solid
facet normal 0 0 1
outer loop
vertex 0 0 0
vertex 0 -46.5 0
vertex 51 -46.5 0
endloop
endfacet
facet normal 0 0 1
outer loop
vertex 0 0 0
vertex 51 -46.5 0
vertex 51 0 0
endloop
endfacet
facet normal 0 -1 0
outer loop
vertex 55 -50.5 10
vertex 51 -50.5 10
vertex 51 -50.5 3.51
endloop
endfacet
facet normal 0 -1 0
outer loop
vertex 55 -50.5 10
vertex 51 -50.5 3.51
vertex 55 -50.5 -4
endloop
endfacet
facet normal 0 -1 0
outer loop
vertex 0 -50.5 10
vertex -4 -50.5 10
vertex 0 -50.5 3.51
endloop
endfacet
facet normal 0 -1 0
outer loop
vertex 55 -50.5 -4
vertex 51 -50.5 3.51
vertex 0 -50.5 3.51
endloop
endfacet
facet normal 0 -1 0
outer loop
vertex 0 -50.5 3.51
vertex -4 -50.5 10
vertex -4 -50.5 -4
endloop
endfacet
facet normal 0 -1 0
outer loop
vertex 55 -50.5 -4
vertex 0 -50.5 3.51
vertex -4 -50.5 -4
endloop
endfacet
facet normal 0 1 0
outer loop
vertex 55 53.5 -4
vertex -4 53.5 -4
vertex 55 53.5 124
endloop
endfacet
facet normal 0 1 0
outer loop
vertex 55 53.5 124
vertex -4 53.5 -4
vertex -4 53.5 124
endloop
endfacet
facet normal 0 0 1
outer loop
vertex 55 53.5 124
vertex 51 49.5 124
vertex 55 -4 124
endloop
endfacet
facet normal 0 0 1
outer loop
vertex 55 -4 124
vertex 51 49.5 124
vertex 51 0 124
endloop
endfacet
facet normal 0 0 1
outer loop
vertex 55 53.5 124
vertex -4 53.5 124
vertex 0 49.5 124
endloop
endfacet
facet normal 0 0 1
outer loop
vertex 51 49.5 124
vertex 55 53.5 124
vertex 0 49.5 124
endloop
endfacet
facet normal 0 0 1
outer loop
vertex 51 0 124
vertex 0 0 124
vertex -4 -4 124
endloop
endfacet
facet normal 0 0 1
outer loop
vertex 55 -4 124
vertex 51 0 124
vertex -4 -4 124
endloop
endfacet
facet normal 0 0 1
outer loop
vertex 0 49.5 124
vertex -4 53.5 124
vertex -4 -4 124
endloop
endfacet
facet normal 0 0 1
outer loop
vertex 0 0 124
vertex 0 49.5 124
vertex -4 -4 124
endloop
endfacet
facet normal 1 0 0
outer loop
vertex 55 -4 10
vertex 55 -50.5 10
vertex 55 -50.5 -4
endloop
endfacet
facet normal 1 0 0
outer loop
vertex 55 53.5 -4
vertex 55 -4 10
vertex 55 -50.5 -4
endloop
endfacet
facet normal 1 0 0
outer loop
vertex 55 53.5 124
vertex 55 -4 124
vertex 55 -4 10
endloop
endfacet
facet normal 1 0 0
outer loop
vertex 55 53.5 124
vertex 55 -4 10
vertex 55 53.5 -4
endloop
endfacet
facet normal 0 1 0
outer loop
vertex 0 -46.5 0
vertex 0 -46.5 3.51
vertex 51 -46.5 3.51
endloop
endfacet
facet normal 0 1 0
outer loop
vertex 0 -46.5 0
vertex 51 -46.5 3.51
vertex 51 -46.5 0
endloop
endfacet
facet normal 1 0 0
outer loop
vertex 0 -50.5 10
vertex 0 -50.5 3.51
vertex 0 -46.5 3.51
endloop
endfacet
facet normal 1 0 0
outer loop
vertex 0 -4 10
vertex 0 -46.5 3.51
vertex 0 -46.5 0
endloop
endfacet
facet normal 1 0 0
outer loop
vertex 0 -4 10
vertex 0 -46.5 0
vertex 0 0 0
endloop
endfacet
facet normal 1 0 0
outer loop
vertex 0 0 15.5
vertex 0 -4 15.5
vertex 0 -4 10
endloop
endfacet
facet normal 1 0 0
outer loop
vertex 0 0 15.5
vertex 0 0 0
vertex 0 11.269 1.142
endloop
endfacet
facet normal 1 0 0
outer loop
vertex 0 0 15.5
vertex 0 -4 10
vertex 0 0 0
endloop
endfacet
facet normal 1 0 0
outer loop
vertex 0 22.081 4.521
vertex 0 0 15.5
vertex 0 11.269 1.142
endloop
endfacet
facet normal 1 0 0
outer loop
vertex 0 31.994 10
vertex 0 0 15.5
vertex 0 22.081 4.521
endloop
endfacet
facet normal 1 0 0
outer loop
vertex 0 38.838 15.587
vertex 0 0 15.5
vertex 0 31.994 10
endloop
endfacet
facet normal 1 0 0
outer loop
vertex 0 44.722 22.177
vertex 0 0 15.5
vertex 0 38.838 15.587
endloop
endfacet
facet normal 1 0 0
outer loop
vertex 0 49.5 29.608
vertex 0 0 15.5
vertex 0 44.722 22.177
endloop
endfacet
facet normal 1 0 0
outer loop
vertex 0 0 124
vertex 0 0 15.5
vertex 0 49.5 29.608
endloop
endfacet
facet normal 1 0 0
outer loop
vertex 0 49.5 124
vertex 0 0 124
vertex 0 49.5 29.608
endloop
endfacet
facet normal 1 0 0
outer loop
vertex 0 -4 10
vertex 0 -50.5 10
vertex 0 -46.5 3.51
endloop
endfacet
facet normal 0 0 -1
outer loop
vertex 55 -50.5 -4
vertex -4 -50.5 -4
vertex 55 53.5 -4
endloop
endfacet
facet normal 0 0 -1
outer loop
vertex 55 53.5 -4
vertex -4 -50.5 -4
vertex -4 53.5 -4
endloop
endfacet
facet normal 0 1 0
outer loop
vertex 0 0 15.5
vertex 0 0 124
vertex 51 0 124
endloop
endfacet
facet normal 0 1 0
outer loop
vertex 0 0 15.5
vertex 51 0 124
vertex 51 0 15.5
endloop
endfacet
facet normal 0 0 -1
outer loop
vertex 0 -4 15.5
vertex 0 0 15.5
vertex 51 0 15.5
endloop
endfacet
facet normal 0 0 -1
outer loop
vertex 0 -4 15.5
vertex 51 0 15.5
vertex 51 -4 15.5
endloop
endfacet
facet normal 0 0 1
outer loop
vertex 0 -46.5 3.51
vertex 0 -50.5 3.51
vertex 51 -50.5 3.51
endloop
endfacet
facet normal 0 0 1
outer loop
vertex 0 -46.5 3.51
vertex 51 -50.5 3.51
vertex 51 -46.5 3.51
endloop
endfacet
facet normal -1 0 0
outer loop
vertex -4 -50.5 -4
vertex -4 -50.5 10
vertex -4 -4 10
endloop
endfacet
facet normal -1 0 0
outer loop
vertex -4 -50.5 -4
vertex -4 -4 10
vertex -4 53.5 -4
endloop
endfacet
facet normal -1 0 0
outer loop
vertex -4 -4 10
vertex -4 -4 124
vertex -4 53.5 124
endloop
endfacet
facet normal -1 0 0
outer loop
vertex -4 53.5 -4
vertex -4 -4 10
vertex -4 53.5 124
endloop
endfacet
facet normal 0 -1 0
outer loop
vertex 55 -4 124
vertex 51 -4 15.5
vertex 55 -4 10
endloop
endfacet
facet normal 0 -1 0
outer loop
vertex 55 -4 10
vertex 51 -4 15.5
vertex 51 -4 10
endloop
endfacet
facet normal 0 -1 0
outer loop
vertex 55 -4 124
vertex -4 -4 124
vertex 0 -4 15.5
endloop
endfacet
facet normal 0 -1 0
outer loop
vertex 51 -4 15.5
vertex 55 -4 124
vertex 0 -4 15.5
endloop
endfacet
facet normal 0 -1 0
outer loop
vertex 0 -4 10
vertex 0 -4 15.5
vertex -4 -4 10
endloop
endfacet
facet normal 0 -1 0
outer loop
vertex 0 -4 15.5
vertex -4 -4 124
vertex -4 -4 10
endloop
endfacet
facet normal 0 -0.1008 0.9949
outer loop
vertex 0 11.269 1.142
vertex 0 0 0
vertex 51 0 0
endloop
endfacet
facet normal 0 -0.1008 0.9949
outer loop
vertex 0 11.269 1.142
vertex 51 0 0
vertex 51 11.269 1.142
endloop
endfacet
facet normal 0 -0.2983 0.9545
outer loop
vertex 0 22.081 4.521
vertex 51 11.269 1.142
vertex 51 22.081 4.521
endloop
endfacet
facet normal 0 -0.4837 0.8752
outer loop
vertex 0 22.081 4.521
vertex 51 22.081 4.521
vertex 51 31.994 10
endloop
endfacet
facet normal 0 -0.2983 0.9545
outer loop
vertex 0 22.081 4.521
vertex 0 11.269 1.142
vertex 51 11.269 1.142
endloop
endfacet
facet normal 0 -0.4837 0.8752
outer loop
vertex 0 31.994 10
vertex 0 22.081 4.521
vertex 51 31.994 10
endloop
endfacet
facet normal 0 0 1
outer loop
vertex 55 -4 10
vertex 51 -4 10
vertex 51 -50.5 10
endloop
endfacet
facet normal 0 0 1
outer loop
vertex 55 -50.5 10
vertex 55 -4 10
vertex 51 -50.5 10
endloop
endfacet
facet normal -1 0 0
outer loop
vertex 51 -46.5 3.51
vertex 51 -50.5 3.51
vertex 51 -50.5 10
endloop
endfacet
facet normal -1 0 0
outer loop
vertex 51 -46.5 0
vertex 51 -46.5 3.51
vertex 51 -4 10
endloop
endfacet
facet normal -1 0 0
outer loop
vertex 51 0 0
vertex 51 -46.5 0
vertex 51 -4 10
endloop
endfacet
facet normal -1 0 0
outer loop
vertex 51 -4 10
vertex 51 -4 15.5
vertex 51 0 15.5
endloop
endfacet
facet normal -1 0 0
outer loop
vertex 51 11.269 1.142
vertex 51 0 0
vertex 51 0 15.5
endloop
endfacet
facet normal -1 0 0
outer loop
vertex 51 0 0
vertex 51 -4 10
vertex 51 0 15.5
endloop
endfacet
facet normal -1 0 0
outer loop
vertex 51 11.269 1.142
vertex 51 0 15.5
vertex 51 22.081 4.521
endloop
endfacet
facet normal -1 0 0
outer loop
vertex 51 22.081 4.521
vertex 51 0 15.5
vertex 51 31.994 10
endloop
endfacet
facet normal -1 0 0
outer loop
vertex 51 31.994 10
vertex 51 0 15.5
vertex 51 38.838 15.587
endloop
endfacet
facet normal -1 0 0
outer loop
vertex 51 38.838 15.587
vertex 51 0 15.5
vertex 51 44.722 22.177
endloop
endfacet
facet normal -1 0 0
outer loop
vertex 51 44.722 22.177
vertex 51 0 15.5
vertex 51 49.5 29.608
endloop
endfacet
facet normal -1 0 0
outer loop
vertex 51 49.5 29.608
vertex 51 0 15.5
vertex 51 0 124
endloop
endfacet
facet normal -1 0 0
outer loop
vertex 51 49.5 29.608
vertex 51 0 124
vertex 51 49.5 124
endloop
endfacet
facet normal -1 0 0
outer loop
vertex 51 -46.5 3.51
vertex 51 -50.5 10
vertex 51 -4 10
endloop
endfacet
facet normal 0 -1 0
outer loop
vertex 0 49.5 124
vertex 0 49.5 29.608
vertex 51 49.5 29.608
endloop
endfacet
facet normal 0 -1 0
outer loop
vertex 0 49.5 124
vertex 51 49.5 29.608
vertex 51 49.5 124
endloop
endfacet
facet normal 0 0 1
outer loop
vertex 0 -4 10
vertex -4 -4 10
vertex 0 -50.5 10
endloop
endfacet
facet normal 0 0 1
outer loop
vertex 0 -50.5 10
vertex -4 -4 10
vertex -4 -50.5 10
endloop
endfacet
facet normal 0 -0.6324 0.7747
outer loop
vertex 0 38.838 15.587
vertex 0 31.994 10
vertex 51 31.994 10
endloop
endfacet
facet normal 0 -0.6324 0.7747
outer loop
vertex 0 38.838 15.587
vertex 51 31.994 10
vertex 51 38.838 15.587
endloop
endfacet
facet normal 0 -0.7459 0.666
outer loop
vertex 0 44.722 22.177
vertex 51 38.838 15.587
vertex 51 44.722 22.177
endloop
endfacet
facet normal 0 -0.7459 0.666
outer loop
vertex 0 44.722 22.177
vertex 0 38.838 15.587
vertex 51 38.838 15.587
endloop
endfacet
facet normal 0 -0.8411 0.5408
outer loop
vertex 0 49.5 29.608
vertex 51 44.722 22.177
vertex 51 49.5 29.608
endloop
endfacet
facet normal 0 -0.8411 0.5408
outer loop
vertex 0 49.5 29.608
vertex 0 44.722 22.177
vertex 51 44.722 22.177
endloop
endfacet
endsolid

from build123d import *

# Parameters (mm, degrees)
F0_W     = 4
F0_H     = 6.48995
F0_W_2   = 49.5
F0_H_2   = 4
F1_DEPTH = 4
F2_DEPTH = 55
F3_DEPTH = 51


with BuildPart() as f1:
    # F0 (on Right) → F1 (new body)
    with BuildSketch(Plane.YZ):
        Polygon((46.5, 0), (0, 0), (-46.5, 0), (-46.5, 3.51005), (-50.5, 3.51005), (-50.5, -4), (0, -4), (46.5, -4), (53.5, -4), (53.5, 124), (49.5, 124), (49.5, 120), (49.5, 29.608211), (49.5, 0), align=None)
        with BuildLine():
            ThreePointArc((31.99437, 10), (16.760368, 2.558245), (0, 0))
            Line((0, 0), (46.5, 0))
            Line((46.5, 0), (49.5, 0))
            Line((49.5, 0), (49.5, 29.608211))
            ThreePointArc((49.5, 29.608211), (41.910065, 18.76592), (31.99437, 10))
        make_face()
        with BuildLine():
            Line((0, 10), (0, 0))
            ThreePointArc((0, 0), (16.760368, 2.558245), (31.99437, 10))
            Line((31.99437, 10), (0, 10))
        make_face()
        Polygon((-46.5, 0), (0, 0), (0, 10), (-4, 10), (-46.5, 10), (-46.5, 3.51005), align=None)
        with BuildLine():
            Line((0, 10), (31.99437, 10))
            ThreePointArc((31.99437, 10), (41.910065, 18.76592), (49.5, 29.608211))
            Line((49.5, 29.608211), (49.5, 120))
            Line((49.5, 120), (0, 120))
            Line((0, 120), (0, 56.181986))
            Line((0, 56.181986), (0, 15.5))
            Line((0, 15.5), (-4, 15.5))
            Line((-4, 15.5), (-4, 10))
            Line((-4, 10), (0, 10))
        make_face()
        with Locations((-48.5, 6.755025)):
            Rectangle(F0_W, F0_H)
        Polygon((-4, 124), (-4, 15.5), (0, 15.5), (0, 56.181986), (0, 120), (0, 124), align=None)
        with Locations((24.75, 122)):
            Rectangle(F0_W_2, F0_H_2)
    extrude(amount=-F1_DEPTH)

    # F0 (on Right) → F2 (join)
    with BuildSketch(Plane.YZ):
        Polygon((46.5, 0), (0, 0), (-46.5, 0), (-46.5, 3.51005), (-50.5, 3.51005), (-50.5, -4), (0, -4), (46.5, -4), (53.5, -4), (53.5, 124), (49.5, 124), (49.5, 120), (49.5, 29.608211), (49.5, 0), align=None)
        with BuildLine():
            ThreePointArc((31.99437, 10), (16.760368, 2.558245), (0, 0))
            Line((0, 0), (46.5, 0))
            Line((46.5, 0), (49.5, 0))
            Line((49.5, 0), (49.5, 29.608211))
            ThreePointArc((49.5, 29.608211), (41.910065, 18.76592), (31.99437, 10))
        make_face()
        with BuildLine():
            Line((0, 10), (31.99437, 10))
            ThreePointArc((31.99437, 10), (41.910065, 18.76592), (49.5, 29.608211))
            Line((49.5, 29.608211), (49.5, 120))
            Line((49.5, 120), (0, 120))
            Line((0, 120), (0, 56.181986))
            Line((0, 56.181986), (0, 15.5))
            Line((0, 15.5), (-4, 15.5))
            Line((-4, 15.5), (-4, 10))
            Line((-4, 10), (0, 10))
        make_face()
        Polygon((-46.5, 0), (0, 0), (0, 10), (-4, 10), (-46.5, 10), (-46.5, 3.51005), align=None)
        with BuildLine():
            Line((0, 10), (0, 0))
            ThreePointArc((0, 0), (16.760368, 2.558245), (31.99437, 10))
            Line((31.99437, 10), (0, 10))
        make_face()
        with Locations((-48.5, 6.755025)):
            Rectangle(F0_W, F0_H)
        Polygon((-4, 124), (-4, 15.5), (0, 15.5), (0, 56.181986), (0, 120), (0, 124), align=None)
        with Locations((24.75, 122)):
            Rectangle(F0_W_2, F0_H_2)
    extrude(amount=F2_DEPTH)

    # F0 (on Right) → F3 (cut)
    with BuildSketch(Plane.YZ):
        with BuildLine():
            Line((0, 10), (31.99437, 10))
            ThreePointArc((31.99437, 10), (41.910065, 18.76592), (49.5, 29.608211))
            Line((49.5, 29.608211), (49.5, 120))
            Line((49.5, 120), (0, 120))
            Line((0, 120), (0, 56.181986))
            Line((0, 56.181986), (0, 15.5))
            Line((0, 15.5), (-4, 15.5))
            Line((-4, 15.5), (-4, 10))
            Line((-4, 10), (0, 10))
        make_face()
        with BuildLine():
            Line((0, 10), (0, 0))
            ThreePointArc((0, 0), (16.760368, 2.558245), (31.99437, 10))
            Line((31.99437, 10), (0, 10))
        make_face()
        Polygon((-46.5, 0), (0, 0), (0, 10), (-4, 10), (-46.5, 10), (-46.5, 3.51005), align=None)
        with Locations((-48.5, 6.755025)):
            Rectangle(F0_W, F0_H)
        with Locations((24.75, 122)):
            Rectangle(F0_W_2, F0_H_2)
    extrude(amount=F3_DEPTH, mode=Mode.SUBTRACT)


solid = f1.part
